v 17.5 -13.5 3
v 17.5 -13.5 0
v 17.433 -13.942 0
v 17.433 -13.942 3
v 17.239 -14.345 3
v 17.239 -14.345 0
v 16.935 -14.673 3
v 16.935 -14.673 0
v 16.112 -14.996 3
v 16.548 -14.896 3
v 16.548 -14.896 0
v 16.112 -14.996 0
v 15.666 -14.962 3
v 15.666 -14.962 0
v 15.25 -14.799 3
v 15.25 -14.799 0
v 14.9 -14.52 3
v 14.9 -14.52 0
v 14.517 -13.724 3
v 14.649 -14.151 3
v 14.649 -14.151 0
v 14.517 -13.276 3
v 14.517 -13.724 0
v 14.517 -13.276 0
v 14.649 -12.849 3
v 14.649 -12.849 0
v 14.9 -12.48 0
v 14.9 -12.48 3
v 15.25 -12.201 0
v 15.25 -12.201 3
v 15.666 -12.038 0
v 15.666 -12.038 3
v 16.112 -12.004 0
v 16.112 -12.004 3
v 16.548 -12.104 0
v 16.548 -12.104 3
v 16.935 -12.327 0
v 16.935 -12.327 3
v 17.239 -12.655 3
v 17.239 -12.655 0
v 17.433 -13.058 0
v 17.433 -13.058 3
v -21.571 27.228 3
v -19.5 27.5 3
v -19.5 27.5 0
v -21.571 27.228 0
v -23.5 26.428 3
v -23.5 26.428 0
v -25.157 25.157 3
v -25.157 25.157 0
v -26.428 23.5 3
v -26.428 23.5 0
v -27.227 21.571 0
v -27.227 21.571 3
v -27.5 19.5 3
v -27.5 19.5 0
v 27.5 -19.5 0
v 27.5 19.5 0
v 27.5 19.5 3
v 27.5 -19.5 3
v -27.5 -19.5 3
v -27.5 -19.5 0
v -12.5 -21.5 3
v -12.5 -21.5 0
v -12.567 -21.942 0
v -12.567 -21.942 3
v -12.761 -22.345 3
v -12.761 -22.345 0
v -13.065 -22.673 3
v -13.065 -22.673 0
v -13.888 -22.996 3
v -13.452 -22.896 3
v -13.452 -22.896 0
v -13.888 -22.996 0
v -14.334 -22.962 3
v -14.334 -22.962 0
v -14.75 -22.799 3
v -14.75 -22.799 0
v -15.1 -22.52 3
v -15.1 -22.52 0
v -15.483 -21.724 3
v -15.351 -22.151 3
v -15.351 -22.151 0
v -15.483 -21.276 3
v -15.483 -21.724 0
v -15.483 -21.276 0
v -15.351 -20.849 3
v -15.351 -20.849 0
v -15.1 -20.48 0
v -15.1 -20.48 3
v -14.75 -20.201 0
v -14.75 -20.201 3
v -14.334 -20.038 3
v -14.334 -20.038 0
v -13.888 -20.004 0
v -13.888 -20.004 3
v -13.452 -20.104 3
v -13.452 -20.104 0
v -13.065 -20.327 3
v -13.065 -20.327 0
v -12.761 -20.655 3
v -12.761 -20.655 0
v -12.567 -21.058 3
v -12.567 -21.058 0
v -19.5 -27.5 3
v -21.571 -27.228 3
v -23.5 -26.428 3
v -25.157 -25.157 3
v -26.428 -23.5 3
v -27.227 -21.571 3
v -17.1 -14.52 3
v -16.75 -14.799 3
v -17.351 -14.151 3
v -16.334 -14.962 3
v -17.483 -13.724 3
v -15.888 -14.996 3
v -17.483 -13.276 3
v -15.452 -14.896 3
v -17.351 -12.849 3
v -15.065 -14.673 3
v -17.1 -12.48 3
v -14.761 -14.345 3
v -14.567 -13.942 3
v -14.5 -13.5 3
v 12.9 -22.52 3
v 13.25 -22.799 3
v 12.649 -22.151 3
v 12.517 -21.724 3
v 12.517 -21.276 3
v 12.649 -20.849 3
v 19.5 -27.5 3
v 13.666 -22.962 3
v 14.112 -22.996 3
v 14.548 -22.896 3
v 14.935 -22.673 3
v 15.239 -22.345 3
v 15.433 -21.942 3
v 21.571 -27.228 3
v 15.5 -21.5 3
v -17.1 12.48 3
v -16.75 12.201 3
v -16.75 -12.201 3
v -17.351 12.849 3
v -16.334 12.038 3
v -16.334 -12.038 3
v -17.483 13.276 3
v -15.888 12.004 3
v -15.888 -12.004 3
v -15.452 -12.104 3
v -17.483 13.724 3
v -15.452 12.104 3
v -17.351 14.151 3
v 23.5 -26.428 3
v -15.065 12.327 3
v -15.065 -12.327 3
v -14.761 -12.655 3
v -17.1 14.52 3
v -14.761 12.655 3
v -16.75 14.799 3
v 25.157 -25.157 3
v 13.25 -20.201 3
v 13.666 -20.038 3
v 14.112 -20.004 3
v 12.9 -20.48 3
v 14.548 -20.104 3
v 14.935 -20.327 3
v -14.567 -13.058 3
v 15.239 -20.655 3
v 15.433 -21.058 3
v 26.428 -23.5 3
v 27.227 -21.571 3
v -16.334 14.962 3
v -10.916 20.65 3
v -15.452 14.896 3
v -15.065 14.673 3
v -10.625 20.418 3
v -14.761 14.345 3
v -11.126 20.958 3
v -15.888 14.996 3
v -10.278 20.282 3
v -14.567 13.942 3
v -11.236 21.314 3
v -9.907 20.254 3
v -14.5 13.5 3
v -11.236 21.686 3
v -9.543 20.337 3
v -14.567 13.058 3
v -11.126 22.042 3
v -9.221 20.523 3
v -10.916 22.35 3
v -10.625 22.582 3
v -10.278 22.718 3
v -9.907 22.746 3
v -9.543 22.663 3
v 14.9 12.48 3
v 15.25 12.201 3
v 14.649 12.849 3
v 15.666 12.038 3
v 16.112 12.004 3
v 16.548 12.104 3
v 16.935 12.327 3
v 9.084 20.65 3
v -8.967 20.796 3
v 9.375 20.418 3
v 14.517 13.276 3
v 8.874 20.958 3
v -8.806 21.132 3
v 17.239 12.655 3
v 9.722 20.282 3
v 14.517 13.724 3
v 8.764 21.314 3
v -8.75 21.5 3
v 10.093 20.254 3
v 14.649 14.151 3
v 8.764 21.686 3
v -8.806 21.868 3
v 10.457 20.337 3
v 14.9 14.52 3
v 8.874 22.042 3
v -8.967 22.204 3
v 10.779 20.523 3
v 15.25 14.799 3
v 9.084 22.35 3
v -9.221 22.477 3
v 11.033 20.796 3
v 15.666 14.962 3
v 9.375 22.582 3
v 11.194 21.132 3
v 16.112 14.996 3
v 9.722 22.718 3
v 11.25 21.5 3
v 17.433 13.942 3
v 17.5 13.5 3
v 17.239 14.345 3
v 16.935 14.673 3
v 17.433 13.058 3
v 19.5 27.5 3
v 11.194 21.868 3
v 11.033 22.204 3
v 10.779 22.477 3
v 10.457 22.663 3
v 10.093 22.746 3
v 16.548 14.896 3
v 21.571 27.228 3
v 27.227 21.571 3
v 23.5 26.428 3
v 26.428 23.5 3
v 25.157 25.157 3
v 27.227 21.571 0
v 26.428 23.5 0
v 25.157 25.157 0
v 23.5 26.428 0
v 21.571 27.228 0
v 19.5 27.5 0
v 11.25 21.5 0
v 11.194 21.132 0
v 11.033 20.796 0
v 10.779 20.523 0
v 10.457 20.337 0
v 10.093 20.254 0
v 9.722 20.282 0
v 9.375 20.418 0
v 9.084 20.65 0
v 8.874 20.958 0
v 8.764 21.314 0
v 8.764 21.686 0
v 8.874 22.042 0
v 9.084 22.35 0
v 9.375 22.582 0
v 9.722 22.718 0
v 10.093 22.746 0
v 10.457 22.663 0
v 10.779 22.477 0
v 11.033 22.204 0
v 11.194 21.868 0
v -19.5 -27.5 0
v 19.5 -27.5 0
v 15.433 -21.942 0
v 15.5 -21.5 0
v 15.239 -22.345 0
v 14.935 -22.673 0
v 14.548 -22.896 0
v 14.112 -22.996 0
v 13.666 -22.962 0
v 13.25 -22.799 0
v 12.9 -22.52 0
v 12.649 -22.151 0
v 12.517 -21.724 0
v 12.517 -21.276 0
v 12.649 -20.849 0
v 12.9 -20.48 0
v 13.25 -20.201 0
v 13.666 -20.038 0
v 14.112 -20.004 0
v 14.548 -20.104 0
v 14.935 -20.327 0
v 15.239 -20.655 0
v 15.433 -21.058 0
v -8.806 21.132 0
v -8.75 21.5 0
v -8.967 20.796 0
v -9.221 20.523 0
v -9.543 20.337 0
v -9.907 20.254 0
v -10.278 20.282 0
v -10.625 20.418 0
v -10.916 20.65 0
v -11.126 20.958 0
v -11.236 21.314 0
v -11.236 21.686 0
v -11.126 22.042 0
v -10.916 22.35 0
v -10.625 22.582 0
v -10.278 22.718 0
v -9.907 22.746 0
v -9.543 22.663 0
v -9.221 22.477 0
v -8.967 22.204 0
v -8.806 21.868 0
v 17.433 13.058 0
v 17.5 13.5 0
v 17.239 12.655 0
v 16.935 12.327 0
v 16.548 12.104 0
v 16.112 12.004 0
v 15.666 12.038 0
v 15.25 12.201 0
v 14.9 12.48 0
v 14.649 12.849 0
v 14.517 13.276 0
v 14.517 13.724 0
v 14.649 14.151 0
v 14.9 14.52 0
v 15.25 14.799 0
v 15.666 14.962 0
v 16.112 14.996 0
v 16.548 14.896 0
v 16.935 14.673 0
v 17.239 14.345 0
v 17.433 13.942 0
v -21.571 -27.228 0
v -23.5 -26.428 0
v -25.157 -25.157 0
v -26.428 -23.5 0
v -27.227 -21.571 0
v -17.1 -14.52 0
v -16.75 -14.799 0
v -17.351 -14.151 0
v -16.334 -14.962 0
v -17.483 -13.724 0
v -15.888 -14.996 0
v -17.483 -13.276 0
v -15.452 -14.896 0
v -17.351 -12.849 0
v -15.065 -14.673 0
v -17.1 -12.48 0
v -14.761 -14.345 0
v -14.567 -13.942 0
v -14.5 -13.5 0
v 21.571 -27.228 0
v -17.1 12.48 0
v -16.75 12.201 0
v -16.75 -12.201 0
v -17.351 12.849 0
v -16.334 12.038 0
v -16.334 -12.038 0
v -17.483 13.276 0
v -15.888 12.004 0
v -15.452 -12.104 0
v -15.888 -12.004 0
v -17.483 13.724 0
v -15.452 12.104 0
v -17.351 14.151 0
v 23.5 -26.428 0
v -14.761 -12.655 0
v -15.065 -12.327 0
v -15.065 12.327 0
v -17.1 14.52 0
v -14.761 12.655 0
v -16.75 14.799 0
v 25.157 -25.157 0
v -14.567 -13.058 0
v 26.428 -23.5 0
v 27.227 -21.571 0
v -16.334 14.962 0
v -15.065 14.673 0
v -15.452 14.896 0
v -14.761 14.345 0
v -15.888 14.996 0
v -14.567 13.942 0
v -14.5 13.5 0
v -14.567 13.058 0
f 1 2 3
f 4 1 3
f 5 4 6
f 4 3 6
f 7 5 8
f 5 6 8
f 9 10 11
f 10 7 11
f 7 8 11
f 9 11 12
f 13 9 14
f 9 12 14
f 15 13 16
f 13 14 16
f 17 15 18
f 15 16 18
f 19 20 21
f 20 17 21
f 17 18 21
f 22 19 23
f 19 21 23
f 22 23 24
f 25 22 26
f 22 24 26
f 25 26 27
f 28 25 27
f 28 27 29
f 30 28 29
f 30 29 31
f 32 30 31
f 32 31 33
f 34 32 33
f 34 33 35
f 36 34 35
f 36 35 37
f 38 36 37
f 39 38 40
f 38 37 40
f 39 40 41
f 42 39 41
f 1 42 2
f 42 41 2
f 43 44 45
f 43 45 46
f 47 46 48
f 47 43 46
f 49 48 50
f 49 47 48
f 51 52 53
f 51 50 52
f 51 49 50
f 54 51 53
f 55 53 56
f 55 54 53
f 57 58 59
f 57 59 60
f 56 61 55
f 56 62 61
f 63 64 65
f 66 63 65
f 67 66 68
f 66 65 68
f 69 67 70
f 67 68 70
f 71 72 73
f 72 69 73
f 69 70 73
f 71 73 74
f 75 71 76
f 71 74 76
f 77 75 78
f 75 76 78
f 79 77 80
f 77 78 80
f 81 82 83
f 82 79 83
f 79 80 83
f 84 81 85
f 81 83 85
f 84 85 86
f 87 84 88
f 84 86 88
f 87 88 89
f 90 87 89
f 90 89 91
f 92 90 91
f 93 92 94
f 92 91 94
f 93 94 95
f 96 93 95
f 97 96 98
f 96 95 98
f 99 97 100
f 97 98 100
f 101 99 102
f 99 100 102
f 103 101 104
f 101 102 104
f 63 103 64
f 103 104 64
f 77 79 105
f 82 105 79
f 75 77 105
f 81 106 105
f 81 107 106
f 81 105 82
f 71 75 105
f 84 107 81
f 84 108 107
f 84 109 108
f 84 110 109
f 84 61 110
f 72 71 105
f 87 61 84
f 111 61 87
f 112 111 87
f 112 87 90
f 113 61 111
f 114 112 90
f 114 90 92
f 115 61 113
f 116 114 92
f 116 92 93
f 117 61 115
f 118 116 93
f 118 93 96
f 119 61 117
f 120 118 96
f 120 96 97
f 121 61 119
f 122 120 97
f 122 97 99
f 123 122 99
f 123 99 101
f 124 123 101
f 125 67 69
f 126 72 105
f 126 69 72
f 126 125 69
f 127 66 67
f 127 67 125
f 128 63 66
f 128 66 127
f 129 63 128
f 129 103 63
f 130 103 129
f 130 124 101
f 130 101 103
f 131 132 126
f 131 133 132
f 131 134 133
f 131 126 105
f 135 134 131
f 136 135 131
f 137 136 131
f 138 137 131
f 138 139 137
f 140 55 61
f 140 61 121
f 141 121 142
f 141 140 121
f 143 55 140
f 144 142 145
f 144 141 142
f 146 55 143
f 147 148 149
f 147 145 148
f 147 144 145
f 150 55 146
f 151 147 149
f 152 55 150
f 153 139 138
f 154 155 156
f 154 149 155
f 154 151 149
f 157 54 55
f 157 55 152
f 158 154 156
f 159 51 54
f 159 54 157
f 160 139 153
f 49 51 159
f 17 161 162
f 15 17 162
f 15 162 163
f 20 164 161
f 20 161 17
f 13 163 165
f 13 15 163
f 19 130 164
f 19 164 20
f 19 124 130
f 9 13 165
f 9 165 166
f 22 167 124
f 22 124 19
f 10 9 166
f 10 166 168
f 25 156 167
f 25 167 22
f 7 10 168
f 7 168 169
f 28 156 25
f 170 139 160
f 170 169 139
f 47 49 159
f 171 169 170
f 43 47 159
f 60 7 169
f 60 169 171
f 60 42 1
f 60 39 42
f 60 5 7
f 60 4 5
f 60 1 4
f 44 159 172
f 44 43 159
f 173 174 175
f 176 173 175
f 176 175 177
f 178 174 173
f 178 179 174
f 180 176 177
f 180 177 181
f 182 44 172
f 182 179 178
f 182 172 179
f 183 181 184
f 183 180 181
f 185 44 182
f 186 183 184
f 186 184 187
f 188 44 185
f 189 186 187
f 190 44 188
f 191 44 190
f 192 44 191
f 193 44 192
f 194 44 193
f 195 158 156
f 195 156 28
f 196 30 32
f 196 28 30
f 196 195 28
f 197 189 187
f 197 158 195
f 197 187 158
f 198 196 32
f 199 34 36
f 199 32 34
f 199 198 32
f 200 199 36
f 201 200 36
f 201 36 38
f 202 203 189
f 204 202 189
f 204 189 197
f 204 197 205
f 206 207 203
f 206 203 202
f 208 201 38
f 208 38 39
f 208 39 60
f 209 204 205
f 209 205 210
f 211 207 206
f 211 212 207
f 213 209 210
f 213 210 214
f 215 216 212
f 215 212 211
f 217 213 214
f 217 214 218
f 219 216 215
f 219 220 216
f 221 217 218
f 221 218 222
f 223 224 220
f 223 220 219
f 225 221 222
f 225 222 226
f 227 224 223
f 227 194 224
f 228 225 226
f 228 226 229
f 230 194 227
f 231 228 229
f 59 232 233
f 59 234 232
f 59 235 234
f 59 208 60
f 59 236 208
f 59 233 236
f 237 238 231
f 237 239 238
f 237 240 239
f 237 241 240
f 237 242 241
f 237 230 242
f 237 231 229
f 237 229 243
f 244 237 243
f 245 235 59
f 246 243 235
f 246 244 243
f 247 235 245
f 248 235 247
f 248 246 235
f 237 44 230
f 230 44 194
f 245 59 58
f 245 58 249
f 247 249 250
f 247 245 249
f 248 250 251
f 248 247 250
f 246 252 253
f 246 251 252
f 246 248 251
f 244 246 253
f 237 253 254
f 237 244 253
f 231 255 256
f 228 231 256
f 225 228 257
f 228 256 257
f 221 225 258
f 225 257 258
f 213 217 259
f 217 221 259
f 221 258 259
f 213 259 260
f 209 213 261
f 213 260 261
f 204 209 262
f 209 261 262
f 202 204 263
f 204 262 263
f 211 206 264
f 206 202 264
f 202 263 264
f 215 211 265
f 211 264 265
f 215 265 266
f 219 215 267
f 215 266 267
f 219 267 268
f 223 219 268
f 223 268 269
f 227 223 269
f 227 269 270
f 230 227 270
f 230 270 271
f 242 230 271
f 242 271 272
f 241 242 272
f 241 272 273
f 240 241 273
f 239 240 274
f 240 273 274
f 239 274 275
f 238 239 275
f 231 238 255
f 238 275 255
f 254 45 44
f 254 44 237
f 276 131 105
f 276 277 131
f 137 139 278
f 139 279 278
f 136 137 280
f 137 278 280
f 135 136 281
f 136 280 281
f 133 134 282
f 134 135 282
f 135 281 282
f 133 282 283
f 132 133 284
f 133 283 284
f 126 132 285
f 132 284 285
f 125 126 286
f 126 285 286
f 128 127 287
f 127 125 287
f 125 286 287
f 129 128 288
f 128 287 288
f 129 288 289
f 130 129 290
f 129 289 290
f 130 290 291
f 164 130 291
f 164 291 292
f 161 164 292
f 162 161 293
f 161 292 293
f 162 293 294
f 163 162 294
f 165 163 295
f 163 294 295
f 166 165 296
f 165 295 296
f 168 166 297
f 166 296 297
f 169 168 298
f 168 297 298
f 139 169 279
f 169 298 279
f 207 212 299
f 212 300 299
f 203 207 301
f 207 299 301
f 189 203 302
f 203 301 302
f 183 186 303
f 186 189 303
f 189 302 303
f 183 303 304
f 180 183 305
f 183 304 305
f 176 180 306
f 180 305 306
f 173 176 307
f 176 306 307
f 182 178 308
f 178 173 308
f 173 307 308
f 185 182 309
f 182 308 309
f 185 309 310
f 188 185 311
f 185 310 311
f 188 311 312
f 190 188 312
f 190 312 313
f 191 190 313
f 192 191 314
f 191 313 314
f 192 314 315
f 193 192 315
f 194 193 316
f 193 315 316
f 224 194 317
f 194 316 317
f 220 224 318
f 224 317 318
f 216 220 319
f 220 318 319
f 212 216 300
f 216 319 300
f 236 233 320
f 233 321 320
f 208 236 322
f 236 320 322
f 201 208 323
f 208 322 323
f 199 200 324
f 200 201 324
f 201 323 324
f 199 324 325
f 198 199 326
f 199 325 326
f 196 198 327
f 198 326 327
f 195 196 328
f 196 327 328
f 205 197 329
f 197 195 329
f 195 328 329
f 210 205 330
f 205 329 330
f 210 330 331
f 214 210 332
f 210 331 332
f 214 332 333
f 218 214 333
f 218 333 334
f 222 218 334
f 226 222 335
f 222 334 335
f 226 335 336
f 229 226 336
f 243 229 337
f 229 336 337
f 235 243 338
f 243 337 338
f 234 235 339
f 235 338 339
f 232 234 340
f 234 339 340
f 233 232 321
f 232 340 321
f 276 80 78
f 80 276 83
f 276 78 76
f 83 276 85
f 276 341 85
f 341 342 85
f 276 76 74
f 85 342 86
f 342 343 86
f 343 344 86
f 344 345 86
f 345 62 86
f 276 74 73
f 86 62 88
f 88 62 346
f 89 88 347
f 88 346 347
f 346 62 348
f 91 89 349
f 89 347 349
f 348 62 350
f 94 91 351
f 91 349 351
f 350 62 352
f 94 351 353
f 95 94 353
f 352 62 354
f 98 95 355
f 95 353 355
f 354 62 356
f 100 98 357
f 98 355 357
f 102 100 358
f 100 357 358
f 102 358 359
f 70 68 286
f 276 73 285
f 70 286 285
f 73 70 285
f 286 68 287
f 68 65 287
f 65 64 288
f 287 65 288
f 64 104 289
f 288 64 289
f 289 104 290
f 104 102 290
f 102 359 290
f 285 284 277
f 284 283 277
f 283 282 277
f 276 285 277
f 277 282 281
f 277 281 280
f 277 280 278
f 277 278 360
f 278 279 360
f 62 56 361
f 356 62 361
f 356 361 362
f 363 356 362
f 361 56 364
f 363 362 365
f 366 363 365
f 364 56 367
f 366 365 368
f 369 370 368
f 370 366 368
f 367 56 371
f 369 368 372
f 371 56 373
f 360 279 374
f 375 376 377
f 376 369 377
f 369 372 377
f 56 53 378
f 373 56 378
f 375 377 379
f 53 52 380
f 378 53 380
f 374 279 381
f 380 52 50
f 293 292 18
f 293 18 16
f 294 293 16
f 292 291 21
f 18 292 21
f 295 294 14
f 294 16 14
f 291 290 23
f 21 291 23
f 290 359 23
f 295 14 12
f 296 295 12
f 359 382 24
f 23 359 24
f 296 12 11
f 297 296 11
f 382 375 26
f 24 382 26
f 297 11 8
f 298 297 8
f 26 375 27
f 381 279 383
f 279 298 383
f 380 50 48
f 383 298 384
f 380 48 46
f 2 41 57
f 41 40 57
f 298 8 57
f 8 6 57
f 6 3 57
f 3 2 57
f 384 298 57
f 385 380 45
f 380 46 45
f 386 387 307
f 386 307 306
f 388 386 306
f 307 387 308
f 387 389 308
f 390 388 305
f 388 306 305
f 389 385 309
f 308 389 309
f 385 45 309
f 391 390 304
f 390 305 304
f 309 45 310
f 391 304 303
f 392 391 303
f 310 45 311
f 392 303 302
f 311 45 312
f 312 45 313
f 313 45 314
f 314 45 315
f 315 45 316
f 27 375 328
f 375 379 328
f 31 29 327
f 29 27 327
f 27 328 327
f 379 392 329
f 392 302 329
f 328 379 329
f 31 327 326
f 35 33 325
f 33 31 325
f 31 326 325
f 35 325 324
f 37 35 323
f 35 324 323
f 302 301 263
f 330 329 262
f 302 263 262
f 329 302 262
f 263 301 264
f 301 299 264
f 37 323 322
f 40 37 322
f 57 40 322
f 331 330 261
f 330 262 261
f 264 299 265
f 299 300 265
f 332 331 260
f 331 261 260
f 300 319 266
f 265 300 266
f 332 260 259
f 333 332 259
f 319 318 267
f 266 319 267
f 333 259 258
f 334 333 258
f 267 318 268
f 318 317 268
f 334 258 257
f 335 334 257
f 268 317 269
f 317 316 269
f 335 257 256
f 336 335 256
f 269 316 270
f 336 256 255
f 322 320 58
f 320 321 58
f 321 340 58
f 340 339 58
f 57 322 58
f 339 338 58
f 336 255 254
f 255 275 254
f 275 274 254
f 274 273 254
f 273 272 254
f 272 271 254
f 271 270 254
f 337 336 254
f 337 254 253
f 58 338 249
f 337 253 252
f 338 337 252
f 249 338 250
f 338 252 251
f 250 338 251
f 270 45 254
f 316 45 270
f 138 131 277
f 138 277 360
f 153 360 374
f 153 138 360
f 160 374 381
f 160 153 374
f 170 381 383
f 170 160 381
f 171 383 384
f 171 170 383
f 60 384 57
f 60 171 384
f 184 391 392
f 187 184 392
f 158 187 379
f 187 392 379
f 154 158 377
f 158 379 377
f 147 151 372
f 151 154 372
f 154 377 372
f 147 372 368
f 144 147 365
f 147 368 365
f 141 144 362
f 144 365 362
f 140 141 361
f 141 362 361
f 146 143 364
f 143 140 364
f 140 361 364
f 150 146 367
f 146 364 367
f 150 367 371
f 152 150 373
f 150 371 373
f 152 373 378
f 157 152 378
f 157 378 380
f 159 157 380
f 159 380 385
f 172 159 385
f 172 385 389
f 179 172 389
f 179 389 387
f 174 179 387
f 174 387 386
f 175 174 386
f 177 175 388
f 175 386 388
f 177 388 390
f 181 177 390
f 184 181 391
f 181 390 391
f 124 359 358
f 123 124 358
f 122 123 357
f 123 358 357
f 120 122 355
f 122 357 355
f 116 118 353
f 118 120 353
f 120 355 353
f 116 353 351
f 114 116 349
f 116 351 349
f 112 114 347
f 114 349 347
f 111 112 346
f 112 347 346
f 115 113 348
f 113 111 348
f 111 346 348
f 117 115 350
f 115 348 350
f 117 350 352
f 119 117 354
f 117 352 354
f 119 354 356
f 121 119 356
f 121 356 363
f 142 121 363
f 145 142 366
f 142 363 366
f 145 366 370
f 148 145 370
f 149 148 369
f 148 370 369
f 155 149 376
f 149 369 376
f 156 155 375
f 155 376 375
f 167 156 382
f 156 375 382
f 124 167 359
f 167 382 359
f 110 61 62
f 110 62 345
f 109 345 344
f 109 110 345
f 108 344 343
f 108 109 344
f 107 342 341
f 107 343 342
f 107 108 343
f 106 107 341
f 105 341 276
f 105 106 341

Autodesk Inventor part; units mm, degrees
ref_plane "YZ Plane" through (0, 0, 0) normal (1, 0, 0) x (0, 1, 0)
ref_plane "XZ Plane" through (0, 0, 0) normal (0, 1, 0) x (-1, 0, 0)
ref_plane "XY Plane" through (0, 0, 0) normal (0, 0, 1) x (1, 0, 0)
sketch "Sketch1" plane through (0, 0, 0) normal (0, 0, 1) x (1, 0, 0)
  point P0 (0, 0)
sketch "Sketch2" plane through (0, 0, 0) normal (0, 0, 1) x (1, 0, 0)
  line L0 (27.5, -27.5002) -> (-27.5, -27.5002)
  line L1 (-27.5, -27.5002) -> (-27.5, 27.5002)
  line L2 (-27.5, 27.5002) -> (27.5, 27.5002)
  line L3 (27.5, 27.5002) -> (27.5, -27.5002)
  circle A0 centre (16, 13.5) radius 1.5
  circle A1 centre (-16, 13.5) radius 1.5
  circle A2 centre (-16, -13.5) radius 1.5
  circle A3 centre (16, -13.5) radius 1.5
  circle A4 centre (14, -21.5) radius 1.5
  circle A5 centre (-14, -21.5) radius 1.5
  circle A6 centre (10, 21.5) radius 1.2498
  circle A7 centre (-10, 21.5) radius 1.2498
extrude "Extrusion3" add sketch "Sketch2" along normal blind 3
fillet "Fillet3" radius 8 4 edges at (27.5, 27.5002, 1.5) (-27.5, 27.5002, 1.5) (27.5, -27.5002, 1.5) (-27.5, -27.5002, 1.5)
properties part number "retractable_landing_skids_adapter_plate" material "CFRP"
